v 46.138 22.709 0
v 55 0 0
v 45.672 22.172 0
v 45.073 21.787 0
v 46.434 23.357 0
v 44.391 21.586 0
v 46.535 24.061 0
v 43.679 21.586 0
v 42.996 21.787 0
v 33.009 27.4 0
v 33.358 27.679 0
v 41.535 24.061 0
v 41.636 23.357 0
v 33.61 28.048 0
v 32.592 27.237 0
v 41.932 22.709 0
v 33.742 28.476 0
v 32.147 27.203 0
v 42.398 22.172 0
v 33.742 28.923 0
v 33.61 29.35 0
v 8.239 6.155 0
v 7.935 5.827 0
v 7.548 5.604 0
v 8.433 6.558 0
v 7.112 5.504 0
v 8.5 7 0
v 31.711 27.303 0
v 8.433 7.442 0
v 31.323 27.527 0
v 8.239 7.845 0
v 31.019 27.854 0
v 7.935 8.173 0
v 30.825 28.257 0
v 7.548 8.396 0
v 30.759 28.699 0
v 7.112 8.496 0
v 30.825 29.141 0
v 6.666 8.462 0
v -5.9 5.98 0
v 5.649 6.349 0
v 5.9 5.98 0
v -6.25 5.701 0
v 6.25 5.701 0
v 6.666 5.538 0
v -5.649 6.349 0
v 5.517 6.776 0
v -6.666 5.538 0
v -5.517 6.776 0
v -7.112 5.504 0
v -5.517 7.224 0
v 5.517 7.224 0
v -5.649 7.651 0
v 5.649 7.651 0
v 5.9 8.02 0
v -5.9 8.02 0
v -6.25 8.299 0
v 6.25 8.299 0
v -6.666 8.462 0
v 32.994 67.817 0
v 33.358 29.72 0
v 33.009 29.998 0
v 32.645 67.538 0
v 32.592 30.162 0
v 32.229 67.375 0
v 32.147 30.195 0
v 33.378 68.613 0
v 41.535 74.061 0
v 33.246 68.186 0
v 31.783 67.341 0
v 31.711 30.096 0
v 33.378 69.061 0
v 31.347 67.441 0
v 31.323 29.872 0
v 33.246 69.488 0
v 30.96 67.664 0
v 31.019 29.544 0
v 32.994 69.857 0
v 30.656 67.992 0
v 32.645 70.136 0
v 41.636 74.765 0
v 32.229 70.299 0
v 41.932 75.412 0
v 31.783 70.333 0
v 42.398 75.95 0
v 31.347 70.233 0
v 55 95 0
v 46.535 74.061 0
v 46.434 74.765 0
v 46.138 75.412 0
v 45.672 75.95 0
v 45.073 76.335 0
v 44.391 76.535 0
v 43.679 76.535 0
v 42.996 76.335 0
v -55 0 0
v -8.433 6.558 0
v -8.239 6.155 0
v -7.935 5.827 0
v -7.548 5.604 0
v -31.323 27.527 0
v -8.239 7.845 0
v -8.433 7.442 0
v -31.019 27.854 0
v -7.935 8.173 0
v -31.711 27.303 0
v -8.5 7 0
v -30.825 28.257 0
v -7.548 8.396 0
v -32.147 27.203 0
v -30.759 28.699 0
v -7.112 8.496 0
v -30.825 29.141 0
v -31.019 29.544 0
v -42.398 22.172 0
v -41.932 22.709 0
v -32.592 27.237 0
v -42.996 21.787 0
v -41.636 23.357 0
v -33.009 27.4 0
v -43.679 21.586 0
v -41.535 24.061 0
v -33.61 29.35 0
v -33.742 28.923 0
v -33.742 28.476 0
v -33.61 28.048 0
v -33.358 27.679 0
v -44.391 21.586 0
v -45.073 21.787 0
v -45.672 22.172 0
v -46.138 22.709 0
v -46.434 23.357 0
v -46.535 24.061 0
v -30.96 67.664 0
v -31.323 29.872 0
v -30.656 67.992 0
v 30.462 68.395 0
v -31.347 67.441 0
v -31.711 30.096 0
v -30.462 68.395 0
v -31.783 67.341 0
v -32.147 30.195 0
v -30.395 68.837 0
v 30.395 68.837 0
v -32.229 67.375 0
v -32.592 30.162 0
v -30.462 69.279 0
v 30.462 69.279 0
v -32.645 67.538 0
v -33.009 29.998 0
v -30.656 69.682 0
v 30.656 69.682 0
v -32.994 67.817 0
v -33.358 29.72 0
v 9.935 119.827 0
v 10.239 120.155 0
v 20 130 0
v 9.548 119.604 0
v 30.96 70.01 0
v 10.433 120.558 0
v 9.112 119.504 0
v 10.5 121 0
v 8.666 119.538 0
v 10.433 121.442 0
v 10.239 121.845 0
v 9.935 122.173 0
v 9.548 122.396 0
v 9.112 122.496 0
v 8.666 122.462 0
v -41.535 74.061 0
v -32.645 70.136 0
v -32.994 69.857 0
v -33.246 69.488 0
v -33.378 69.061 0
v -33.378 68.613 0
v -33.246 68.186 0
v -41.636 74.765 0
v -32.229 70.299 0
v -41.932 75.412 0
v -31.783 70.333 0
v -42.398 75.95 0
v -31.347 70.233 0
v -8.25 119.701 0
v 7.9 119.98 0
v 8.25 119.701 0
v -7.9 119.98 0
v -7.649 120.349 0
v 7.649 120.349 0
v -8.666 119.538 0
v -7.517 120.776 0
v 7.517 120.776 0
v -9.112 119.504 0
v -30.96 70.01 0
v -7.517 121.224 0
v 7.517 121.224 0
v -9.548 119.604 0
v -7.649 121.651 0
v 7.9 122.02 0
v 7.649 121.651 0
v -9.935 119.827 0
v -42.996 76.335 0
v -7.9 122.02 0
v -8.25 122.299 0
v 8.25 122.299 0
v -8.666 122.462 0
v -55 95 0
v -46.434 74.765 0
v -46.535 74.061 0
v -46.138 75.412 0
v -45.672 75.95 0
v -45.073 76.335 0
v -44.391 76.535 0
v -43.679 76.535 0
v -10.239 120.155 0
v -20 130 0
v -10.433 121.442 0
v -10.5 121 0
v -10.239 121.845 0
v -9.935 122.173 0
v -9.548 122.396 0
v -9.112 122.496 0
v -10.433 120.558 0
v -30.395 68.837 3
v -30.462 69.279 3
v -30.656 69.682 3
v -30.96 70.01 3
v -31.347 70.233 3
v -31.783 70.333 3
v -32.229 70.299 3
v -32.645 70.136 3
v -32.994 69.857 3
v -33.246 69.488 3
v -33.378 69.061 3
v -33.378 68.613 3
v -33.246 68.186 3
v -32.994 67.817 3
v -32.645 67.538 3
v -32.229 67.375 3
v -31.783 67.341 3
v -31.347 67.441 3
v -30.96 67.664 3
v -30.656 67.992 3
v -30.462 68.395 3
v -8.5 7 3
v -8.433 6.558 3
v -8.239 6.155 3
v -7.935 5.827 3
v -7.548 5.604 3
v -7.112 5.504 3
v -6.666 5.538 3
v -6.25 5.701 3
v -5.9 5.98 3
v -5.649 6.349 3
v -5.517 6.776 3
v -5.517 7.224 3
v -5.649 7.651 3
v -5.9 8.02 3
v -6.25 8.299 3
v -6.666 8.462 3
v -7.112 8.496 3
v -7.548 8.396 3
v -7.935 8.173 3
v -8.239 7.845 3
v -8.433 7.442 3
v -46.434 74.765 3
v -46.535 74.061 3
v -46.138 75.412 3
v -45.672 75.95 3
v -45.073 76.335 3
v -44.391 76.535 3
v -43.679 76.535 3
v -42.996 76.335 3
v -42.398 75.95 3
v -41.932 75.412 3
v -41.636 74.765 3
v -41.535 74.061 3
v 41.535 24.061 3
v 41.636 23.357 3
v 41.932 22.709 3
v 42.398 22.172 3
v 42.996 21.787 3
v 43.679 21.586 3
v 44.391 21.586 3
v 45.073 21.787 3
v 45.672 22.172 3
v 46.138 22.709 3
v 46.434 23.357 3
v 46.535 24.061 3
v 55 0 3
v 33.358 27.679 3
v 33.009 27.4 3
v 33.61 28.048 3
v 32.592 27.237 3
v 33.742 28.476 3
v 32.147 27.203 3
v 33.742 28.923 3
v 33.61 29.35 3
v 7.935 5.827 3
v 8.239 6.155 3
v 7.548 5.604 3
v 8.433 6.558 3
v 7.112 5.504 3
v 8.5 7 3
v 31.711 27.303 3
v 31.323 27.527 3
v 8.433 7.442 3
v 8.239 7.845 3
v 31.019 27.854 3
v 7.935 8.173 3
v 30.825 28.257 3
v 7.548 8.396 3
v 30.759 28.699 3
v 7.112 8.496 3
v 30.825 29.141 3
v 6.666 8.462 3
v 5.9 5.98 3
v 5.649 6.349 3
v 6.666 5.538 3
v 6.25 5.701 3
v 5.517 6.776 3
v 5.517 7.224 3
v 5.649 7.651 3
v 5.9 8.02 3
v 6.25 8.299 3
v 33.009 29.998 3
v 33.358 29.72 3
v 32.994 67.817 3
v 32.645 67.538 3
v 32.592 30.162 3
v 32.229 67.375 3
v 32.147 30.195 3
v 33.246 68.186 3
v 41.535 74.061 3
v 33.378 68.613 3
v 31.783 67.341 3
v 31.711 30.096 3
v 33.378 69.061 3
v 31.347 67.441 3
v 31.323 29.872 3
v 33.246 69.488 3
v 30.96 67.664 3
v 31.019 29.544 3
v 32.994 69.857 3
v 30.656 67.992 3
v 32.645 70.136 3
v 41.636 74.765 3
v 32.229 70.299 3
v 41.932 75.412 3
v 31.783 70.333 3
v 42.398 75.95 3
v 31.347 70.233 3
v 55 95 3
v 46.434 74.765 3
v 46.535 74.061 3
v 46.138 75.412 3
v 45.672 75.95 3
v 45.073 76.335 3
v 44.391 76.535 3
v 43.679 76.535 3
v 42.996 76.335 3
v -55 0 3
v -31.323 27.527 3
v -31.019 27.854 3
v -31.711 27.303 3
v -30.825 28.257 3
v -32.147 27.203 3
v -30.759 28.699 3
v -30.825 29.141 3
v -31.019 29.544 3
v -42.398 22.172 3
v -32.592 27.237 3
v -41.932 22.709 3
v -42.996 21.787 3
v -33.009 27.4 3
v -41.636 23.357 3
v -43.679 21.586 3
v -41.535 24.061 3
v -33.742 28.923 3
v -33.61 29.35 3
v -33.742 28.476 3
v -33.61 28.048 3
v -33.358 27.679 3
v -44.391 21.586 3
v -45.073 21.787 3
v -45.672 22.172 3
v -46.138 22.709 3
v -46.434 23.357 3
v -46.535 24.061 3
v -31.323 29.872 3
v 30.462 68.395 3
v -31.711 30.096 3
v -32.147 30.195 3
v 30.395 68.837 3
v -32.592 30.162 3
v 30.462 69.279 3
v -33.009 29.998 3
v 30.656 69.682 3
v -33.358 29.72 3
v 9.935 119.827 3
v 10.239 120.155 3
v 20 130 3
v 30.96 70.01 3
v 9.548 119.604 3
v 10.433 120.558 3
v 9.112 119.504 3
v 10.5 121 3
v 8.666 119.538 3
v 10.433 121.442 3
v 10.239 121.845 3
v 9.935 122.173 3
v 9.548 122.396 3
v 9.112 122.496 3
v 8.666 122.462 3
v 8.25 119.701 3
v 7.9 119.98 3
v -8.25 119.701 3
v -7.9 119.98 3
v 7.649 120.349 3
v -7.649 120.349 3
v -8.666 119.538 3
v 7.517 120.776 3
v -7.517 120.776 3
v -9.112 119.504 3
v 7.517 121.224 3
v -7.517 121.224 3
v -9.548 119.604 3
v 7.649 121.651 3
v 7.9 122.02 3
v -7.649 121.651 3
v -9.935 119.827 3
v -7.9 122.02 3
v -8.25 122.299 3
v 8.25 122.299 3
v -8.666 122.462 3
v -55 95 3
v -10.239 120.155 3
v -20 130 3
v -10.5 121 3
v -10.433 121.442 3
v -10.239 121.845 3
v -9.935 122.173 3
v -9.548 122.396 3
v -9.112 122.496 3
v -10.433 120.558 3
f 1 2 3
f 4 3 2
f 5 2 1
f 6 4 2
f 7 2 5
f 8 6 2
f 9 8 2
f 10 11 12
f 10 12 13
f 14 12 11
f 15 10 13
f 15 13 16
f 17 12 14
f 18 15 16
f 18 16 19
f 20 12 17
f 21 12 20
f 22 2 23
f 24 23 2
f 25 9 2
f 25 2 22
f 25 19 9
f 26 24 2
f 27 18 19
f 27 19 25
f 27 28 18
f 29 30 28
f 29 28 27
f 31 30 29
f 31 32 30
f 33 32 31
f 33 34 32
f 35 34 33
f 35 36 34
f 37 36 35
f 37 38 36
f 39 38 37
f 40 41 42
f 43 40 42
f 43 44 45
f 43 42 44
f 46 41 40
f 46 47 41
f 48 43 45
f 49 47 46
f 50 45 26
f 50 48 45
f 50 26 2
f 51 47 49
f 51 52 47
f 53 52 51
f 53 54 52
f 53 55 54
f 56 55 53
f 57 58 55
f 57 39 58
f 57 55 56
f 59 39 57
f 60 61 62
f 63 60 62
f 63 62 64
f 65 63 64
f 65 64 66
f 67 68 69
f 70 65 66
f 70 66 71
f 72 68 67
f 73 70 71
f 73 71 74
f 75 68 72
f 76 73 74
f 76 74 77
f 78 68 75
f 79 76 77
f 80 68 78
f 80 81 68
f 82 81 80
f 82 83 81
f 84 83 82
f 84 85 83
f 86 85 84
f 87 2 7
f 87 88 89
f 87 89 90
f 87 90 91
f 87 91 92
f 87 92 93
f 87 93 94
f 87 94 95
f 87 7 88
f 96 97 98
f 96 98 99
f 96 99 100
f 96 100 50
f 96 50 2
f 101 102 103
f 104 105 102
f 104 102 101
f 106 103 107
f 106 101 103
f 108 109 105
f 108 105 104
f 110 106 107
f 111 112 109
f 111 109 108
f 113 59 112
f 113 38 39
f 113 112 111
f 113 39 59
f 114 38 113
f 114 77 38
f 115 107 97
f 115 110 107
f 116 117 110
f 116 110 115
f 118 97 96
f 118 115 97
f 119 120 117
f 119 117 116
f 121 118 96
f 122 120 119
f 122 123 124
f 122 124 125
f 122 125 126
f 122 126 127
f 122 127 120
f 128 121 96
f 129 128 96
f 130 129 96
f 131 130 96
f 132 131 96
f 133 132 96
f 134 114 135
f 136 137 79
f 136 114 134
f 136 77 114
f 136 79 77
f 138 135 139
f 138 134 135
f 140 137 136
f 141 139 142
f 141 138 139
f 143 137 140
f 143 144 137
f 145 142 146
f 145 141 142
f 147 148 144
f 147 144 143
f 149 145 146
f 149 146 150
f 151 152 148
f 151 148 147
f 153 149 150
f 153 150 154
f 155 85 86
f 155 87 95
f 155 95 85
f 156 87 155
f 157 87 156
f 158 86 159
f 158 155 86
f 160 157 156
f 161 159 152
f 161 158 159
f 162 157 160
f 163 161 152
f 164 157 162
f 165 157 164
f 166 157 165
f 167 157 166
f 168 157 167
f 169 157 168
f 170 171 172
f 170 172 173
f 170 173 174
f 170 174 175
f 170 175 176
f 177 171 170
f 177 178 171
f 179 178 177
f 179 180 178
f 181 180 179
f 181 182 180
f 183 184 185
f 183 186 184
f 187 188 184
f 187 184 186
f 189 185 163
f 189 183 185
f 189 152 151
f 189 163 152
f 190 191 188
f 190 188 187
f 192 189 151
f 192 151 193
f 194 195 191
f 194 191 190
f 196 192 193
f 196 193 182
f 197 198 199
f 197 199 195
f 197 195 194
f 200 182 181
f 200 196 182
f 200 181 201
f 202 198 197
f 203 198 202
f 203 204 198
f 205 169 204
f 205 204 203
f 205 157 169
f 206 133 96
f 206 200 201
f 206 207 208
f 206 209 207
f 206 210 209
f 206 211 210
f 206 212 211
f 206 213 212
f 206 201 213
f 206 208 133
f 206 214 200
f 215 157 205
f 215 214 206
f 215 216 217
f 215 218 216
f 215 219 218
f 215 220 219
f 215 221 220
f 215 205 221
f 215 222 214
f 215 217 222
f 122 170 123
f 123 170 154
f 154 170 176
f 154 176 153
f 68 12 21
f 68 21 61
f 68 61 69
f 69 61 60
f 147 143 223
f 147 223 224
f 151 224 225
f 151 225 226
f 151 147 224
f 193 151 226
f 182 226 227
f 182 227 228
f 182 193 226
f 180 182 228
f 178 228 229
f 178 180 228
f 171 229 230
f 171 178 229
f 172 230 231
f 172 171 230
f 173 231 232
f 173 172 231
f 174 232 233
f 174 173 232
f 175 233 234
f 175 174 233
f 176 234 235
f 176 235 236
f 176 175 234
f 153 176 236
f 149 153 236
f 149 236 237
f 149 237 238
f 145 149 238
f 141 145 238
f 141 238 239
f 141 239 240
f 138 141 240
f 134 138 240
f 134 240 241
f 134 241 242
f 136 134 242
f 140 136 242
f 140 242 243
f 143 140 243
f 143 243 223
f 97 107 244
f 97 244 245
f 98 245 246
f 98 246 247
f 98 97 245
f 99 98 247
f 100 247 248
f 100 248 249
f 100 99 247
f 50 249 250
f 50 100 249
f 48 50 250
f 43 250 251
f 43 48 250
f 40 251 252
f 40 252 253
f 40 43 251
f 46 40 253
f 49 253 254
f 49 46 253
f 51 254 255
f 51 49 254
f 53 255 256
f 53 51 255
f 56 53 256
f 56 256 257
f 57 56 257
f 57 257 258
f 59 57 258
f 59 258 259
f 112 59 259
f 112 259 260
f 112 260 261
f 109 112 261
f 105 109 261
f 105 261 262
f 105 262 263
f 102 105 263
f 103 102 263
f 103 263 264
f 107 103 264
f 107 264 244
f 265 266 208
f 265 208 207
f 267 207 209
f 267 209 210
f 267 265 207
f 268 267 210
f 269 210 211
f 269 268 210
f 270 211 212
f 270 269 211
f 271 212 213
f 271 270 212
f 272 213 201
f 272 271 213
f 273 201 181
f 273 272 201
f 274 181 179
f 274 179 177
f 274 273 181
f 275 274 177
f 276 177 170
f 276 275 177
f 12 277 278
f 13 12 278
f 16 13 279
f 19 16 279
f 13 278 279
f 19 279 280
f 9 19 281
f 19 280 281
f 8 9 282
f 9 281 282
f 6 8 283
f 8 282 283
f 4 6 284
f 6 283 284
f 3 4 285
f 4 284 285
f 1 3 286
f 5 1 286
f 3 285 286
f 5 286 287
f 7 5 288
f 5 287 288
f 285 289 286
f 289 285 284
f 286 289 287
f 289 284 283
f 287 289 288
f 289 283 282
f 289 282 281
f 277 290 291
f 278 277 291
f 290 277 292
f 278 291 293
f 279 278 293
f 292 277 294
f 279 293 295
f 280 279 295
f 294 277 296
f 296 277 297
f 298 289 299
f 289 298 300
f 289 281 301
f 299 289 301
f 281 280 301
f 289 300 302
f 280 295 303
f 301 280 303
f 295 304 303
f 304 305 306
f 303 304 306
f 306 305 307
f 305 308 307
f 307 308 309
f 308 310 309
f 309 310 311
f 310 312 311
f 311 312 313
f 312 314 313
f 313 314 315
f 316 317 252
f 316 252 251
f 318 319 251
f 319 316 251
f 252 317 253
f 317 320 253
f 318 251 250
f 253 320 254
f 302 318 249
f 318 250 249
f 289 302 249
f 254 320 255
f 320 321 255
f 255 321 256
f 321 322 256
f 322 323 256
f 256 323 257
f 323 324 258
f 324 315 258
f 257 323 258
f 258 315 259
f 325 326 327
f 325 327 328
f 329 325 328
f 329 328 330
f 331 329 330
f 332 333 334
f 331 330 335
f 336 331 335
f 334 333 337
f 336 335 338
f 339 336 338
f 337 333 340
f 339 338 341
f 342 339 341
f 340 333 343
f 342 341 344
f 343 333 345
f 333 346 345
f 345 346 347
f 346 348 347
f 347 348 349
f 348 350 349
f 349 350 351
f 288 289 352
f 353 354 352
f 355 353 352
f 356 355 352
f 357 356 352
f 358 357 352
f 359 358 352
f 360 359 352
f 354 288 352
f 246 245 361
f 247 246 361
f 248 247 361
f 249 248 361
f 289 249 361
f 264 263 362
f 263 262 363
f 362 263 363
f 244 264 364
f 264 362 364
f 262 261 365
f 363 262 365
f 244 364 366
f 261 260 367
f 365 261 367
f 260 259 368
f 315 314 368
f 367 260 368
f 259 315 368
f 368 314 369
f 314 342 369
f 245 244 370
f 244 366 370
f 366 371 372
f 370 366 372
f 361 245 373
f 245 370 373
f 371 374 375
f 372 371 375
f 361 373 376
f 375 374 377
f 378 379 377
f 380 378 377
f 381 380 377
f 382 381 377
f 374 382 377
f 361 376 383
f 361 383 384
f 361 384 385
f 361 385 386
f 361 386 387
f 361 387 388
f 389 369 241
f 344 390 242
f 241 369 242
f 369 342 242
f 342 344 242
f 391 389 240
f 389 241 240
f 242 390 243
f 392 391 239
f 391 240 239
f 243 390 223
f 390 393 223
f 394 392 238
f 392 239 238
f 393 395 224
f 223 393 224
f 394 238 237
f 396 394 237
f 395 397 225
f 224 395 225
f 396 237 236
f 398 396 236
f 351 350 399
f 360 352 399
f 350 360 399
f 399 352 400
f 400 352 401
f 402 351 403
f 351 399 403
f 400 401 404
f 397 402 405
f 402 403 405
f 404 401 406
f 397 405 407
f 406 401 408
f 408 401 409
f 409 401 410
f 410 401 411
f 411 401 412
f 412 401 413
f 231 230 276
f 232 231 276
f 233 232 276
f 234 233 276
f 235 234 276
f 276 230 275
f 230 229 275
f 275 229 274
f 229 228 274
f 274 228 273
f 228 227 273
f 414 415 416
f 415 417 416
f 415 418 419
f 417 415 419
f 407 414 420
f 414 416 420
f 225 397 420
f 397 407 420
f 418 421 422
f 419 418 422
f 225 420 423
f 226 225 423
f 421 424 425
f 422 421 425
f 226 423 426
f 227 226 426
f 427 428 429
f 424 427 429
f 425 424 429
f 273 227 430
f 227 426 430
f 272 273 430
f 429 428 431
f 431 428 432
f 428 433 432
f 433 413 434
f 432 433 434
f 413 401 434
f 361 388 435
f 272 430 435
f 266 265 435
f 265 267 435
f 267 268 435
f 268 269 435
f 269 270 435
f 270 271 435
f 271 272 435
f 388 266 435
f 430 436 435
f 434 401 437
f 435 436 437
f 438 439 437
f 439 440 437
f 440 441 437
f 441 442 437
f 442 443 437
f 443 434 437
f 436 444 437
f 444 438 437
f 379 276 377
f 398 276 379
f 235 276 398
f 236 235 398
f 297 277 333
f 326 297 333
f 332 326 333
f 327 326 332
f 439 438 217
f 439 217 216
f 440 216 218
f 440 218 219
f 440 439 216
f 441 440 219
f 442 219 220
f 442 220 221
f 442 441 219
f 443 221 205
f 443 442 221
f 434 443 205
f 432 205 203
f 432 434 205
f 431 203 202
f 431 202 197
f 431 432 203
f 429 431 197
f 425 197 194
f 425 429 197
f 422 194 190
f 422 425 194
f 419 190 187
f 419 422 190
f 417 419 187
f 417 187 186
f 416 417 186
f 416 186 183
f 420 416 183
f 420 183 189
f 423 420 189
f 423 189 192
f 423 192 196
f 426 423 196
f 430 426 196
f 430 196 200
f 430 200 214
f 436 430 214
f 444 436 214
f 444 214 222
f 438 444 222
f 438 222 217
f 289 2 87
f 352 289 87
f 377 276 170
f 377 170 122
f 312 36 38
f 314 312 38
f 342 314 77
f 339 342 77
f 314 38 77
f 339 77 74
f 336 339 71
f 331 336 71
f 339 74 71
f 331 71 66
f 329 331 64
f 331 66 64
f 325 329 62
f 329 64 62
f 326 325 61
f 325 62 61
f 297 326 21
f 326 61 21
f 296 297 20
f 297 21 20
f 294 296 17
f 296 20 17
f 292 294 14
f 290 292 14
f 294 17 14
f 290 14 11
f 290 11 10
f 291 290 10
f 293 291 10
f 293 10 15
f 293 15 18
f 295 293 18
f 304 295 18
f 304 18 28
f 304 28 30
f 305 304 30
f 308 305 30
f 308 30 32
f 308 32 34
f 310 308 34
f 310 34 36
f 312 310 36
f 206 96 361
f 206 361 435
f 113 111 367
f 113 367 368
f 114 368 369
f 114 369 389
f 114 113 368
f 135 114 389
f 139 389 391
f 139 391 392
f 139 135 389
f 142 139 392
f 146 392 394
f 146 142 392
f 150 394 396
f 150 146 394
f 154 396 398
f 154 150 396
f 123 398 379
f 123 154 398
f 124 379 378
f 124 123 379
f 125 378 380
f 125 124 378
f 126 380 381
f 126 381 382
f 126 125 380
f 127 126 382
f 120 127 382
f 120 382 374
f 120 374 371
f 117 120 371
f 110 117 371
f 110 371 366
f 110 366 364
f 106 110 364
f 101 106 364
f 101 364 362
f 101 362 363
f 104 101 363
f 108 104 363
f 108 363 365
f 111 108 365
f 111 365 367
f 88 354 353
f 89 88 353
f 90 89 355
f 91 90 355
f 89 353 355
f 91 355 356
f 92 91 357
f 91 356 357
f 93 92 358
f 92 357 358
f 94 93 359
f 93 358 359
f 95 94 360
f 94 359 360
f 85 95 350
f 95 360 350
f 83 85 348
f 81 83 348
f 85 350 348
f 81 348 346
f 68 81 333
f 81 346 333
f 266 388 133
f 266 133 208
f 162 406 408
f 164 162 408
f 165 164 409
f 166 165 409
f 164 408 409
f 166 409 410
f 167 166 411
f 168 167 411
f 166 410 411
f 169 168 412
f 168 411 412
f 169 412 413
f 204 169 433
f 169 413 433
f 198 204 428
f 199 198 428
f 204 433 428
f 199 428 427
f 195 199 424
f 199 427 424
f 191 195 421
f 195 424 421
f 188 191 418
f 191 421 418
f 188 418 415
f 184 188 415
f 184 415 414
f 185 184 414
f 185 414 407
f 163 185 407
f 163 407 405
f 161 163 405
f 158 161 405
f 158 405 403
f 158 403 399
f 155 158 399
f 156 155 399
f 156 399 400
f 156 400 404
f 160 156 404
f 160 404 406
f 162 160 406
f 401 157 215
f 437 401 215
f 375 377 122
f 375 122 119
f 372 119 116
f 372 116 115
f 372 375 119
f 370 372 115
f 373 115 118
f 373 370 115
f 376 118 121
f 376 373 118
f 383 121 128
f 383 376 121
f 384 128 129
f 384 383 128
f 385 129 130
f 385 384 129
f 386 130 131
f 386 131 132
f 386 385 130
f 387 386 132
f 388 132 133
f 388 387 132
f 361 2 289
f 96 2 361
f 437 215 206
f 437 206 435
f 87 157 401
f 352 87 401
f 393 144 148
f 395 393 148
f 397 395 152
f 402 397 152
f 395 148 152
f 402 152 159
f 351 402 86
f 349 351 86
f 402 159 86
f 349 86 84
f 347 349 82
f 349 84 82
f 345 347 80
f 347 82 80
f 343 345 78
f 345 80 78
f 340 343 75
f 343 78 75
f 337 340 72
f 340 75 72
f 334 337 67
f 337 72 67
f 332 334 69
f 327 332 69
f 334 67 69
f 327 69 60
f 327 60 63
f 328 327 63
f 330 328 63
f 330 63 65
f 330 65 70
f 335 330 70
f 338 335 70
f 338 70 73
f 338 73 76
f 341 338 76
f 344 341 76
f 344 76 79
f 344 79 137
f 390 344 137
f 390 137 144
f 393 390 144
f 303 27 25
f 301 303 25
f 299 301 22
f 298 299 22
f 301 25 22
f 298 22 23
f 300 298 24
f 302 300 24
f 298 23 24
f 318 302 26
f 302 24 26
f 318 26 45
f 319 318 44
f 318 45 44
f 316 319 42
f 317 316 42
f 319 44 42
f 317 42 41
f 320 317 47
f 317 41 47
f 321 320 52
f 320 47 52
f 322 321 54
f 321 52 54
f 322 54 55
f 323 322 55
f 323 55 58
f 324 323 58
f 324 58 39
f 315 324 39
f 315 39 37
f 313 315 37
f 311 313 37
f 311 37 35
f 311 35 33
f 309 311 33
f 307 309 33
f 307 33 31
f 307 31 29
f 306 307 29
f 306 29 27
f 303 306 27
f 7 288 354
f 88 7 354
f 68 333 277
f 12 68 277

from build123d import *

# Parameters (mm, degrees)
F0_W      = 55
F0_H      = 130
F1_DEPTH  = 3
F2_SIZE   = 35
F4_DEPTH  = 34.03176
F6_D      = 3
F8_D      = 3
F9_R      = 1.5
F10_DEPTH = 25
F11_R     = 1.5
F12_DEPTH = 25


with BuildPart() as f1:
    # F0 (on Top) → F1 (new body)
    with BuildSketch(Plane.XY):
        with Locations((27.5, 65)):
            Rectangle(F0_W, F0_H)
    extrude(amount=F1_DEPTH)

    # F2
    f2_edges = [f1.edges().sort_by_distance(p)[0] for p in [
        (55, 130, 1.5),
    ]]
    chamfer(f2_edges, length=F2_SIZE)

    # F3 (on face) → F4 (cut)
    with BuildSketch(Plane.XY.offset(3)):
        with BuildLine():
            ThreePointArc((46.534898, 74.060881), (44.034898, 76.560881), (41.534898, 74.060881))
            Line((41.534898, 74.060881), (41.534898, 24.060881))
            ThreePointArc((41.534898, 24.060881), (44.034898, 21.560881), (46.534898, 24.060881))
            Line((46.534898, 24.060881), (46.534898, 74.060881))
        make_face()
    extrude(amount=-F4_DEPTH, mode=Mode.SUBTRACT)

    # F6 (through all)
    with Locations(Plane.XY.offset(3)):
        with Locations((31.894885, 68.837039)):
            Hole(F6_D / 2)

    # F8 (through all)
    with Locations(Plane.XY.offset(3)):
        with Locations((32.258615, 28.699279)):
            Hole(F8_D / 2)

    # F9 (on face) → F10 (cut)
    with BuildSketch(Plane(origin=(0, 0, 0), x_dir=(1, 0, 0), z_dir=(0, 0, -1))):
        with Locations((7, -7)):
            Circle(F9_R)
    extrude(amount=-F10_DEPTH, mode=Mode.SUBTRACT)

    # F11 (on face) → F12 (cut)
    with BuildSketch(Plane.XY.offset(3)):
        with Locations((9, 121)):
            Circle(F11_R)
    extrude(amount=-F12_DEPTH, mode=Mode.SUBTRACT)

    # F14: F1 across plane


with BuildPart() as f1_1:
    add(f1.part)
    add(f1.part.mirror(Plane.YZ))


solid = f1_1.part
